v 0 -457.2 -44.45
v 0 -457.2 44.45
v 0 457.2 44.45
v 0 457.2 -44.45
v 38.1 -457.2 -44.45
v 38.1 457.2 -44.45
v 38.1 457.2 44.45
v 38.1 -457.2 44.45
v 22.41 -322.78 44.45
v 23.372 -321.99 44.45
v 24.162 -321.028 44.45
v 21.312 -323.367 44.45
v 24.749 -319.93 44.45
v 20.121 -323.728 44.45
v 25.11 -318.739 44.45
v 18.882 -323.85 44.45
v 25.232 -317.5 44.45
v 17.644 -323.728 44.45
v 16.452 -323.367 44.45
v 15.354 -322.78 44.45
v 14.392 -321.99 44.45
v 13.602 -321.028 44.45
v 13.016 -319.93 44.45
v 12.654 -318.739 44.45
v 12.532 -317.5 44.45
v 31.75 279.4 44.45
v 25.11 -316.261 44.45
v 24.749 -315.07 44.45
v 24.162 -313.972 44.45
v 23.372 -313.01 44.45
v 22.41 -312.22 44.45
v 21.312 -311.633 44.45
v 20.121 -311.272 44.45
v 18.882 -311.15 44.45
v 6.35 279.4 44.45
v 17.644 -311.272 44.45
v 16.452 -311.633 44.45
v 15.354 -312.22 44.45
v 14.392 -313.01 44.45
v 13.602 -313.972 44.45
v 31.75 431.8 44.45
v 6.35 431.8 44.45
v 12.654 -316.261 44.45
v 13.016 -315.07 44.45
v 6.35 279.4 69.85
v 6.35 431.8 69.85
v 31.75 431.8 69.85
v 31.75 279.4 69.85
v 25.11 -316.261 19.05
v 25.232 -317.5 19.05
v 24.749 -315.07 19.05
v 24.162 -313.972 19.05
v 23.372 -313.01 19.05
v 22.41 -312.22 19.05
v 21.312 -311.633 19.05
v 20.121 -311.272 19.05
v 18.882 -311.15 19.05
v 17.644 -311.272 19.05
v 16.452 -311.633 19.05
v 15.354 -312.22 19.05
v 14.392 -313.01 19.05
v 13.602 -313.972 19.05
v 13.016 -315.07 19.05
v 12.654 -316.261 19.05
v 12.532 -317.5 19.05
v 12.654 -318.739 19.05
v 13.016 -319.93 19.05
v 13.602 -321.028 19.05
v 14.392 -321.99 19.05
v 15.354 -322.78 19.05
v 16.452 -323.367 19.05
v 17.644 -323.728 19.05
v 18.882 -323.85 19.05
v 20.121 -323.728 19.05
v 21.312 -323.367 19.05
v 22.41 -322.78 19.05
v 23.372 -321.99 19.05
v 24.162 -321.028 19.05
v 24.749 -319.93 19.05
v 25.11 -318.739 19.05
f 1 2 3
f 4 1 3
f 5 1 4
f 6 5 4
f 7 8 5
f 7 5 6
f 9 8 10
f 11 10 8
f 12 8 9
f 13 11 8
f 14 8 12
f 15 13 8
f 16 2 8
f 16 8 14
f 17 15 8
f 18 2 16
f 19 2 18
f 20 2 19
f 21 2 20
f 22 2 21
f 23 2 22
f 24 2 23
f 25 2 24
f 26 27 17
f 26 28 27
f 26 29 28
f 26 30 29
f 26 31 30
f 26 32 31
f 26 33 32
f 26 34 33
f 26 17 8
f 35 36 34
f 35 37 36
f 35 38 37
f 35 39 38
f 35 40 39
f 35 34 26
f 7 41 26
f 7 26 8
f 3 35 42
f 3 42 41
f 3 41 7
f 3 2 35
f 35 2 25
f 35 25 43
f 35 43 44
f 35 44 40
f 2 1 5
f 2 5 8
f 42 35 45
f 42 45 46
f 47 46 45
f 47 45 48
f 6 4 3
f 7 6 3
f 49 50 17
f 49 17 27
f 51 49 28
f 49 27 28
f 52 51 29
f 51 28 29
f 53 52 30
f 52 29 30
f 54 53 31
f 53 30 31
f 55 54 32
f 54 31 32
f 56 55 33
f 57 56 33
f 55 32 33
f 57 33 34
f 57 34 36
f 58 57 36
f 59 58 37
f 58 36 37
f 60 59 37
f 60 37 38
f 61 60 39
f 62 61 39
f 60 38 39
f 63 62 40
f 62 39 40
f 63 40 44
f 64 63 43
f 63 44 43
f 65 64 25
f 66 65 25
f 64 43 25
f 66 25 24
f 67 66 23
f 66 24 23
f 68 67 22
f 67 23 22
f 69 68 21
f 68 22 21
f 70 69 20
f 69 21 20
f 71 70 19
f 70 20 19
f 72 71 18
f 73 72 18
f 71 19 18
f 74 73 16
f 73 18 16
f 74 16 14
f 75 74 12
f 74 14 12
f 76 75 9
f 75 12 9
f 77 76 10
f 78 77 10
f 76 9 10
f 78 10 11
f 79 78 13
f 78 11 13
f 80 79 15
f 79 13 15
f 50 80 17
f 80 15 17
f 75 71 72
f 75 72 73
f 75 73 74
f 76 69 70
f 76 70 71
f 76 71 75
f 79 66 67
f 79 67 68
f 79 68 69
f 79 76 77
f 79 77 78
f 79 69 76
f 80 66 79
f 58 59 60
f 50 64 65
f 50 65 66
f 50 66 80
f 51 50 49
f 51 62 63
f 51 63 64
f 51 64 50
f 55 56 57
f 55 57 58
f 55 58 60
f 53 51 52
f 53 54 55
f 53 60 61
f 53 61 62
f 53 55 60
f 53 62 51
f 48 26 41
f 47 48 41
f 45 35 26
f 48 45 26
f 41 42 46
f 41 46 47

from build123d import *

# Parameters (mm, degrees)
F0_W     = 914.4
F0_H     = 88.9
F1_DEPTH = 38.1
F2_R     = 6.35
F3_DEPTH = 25.4
F4_W     = 25.4
F4_H     = 152.4
F5_DEPTH = 25.4


with BuildPart() as f1:
    # F0 (on Right) → F1 (new body)
    with BuildSketch(Plane.YZ):
        Rectangle(F0_W, F0_H)
    extrude(amount=F1_DEPTH)

    # F2 (on face) → F3 (cut)
    with BuildSketch(Plane.XY.offset(44.45)):
        with Locations((18.882329, -317.5)):
            Circle(F2_R)
    extrude(amount=-F3_DEPTH, mode=Mode.SUBTRACT)

    # F4 (on face) → F5 (join)
    with BuildSketch(Plane.XY.offset(44.45)):
        with Locations((19.05, 355.6)):
            Rectangle(F4_W, F4_H)
    extrude(amount=F5_DEPTH)


solid = f1.part
